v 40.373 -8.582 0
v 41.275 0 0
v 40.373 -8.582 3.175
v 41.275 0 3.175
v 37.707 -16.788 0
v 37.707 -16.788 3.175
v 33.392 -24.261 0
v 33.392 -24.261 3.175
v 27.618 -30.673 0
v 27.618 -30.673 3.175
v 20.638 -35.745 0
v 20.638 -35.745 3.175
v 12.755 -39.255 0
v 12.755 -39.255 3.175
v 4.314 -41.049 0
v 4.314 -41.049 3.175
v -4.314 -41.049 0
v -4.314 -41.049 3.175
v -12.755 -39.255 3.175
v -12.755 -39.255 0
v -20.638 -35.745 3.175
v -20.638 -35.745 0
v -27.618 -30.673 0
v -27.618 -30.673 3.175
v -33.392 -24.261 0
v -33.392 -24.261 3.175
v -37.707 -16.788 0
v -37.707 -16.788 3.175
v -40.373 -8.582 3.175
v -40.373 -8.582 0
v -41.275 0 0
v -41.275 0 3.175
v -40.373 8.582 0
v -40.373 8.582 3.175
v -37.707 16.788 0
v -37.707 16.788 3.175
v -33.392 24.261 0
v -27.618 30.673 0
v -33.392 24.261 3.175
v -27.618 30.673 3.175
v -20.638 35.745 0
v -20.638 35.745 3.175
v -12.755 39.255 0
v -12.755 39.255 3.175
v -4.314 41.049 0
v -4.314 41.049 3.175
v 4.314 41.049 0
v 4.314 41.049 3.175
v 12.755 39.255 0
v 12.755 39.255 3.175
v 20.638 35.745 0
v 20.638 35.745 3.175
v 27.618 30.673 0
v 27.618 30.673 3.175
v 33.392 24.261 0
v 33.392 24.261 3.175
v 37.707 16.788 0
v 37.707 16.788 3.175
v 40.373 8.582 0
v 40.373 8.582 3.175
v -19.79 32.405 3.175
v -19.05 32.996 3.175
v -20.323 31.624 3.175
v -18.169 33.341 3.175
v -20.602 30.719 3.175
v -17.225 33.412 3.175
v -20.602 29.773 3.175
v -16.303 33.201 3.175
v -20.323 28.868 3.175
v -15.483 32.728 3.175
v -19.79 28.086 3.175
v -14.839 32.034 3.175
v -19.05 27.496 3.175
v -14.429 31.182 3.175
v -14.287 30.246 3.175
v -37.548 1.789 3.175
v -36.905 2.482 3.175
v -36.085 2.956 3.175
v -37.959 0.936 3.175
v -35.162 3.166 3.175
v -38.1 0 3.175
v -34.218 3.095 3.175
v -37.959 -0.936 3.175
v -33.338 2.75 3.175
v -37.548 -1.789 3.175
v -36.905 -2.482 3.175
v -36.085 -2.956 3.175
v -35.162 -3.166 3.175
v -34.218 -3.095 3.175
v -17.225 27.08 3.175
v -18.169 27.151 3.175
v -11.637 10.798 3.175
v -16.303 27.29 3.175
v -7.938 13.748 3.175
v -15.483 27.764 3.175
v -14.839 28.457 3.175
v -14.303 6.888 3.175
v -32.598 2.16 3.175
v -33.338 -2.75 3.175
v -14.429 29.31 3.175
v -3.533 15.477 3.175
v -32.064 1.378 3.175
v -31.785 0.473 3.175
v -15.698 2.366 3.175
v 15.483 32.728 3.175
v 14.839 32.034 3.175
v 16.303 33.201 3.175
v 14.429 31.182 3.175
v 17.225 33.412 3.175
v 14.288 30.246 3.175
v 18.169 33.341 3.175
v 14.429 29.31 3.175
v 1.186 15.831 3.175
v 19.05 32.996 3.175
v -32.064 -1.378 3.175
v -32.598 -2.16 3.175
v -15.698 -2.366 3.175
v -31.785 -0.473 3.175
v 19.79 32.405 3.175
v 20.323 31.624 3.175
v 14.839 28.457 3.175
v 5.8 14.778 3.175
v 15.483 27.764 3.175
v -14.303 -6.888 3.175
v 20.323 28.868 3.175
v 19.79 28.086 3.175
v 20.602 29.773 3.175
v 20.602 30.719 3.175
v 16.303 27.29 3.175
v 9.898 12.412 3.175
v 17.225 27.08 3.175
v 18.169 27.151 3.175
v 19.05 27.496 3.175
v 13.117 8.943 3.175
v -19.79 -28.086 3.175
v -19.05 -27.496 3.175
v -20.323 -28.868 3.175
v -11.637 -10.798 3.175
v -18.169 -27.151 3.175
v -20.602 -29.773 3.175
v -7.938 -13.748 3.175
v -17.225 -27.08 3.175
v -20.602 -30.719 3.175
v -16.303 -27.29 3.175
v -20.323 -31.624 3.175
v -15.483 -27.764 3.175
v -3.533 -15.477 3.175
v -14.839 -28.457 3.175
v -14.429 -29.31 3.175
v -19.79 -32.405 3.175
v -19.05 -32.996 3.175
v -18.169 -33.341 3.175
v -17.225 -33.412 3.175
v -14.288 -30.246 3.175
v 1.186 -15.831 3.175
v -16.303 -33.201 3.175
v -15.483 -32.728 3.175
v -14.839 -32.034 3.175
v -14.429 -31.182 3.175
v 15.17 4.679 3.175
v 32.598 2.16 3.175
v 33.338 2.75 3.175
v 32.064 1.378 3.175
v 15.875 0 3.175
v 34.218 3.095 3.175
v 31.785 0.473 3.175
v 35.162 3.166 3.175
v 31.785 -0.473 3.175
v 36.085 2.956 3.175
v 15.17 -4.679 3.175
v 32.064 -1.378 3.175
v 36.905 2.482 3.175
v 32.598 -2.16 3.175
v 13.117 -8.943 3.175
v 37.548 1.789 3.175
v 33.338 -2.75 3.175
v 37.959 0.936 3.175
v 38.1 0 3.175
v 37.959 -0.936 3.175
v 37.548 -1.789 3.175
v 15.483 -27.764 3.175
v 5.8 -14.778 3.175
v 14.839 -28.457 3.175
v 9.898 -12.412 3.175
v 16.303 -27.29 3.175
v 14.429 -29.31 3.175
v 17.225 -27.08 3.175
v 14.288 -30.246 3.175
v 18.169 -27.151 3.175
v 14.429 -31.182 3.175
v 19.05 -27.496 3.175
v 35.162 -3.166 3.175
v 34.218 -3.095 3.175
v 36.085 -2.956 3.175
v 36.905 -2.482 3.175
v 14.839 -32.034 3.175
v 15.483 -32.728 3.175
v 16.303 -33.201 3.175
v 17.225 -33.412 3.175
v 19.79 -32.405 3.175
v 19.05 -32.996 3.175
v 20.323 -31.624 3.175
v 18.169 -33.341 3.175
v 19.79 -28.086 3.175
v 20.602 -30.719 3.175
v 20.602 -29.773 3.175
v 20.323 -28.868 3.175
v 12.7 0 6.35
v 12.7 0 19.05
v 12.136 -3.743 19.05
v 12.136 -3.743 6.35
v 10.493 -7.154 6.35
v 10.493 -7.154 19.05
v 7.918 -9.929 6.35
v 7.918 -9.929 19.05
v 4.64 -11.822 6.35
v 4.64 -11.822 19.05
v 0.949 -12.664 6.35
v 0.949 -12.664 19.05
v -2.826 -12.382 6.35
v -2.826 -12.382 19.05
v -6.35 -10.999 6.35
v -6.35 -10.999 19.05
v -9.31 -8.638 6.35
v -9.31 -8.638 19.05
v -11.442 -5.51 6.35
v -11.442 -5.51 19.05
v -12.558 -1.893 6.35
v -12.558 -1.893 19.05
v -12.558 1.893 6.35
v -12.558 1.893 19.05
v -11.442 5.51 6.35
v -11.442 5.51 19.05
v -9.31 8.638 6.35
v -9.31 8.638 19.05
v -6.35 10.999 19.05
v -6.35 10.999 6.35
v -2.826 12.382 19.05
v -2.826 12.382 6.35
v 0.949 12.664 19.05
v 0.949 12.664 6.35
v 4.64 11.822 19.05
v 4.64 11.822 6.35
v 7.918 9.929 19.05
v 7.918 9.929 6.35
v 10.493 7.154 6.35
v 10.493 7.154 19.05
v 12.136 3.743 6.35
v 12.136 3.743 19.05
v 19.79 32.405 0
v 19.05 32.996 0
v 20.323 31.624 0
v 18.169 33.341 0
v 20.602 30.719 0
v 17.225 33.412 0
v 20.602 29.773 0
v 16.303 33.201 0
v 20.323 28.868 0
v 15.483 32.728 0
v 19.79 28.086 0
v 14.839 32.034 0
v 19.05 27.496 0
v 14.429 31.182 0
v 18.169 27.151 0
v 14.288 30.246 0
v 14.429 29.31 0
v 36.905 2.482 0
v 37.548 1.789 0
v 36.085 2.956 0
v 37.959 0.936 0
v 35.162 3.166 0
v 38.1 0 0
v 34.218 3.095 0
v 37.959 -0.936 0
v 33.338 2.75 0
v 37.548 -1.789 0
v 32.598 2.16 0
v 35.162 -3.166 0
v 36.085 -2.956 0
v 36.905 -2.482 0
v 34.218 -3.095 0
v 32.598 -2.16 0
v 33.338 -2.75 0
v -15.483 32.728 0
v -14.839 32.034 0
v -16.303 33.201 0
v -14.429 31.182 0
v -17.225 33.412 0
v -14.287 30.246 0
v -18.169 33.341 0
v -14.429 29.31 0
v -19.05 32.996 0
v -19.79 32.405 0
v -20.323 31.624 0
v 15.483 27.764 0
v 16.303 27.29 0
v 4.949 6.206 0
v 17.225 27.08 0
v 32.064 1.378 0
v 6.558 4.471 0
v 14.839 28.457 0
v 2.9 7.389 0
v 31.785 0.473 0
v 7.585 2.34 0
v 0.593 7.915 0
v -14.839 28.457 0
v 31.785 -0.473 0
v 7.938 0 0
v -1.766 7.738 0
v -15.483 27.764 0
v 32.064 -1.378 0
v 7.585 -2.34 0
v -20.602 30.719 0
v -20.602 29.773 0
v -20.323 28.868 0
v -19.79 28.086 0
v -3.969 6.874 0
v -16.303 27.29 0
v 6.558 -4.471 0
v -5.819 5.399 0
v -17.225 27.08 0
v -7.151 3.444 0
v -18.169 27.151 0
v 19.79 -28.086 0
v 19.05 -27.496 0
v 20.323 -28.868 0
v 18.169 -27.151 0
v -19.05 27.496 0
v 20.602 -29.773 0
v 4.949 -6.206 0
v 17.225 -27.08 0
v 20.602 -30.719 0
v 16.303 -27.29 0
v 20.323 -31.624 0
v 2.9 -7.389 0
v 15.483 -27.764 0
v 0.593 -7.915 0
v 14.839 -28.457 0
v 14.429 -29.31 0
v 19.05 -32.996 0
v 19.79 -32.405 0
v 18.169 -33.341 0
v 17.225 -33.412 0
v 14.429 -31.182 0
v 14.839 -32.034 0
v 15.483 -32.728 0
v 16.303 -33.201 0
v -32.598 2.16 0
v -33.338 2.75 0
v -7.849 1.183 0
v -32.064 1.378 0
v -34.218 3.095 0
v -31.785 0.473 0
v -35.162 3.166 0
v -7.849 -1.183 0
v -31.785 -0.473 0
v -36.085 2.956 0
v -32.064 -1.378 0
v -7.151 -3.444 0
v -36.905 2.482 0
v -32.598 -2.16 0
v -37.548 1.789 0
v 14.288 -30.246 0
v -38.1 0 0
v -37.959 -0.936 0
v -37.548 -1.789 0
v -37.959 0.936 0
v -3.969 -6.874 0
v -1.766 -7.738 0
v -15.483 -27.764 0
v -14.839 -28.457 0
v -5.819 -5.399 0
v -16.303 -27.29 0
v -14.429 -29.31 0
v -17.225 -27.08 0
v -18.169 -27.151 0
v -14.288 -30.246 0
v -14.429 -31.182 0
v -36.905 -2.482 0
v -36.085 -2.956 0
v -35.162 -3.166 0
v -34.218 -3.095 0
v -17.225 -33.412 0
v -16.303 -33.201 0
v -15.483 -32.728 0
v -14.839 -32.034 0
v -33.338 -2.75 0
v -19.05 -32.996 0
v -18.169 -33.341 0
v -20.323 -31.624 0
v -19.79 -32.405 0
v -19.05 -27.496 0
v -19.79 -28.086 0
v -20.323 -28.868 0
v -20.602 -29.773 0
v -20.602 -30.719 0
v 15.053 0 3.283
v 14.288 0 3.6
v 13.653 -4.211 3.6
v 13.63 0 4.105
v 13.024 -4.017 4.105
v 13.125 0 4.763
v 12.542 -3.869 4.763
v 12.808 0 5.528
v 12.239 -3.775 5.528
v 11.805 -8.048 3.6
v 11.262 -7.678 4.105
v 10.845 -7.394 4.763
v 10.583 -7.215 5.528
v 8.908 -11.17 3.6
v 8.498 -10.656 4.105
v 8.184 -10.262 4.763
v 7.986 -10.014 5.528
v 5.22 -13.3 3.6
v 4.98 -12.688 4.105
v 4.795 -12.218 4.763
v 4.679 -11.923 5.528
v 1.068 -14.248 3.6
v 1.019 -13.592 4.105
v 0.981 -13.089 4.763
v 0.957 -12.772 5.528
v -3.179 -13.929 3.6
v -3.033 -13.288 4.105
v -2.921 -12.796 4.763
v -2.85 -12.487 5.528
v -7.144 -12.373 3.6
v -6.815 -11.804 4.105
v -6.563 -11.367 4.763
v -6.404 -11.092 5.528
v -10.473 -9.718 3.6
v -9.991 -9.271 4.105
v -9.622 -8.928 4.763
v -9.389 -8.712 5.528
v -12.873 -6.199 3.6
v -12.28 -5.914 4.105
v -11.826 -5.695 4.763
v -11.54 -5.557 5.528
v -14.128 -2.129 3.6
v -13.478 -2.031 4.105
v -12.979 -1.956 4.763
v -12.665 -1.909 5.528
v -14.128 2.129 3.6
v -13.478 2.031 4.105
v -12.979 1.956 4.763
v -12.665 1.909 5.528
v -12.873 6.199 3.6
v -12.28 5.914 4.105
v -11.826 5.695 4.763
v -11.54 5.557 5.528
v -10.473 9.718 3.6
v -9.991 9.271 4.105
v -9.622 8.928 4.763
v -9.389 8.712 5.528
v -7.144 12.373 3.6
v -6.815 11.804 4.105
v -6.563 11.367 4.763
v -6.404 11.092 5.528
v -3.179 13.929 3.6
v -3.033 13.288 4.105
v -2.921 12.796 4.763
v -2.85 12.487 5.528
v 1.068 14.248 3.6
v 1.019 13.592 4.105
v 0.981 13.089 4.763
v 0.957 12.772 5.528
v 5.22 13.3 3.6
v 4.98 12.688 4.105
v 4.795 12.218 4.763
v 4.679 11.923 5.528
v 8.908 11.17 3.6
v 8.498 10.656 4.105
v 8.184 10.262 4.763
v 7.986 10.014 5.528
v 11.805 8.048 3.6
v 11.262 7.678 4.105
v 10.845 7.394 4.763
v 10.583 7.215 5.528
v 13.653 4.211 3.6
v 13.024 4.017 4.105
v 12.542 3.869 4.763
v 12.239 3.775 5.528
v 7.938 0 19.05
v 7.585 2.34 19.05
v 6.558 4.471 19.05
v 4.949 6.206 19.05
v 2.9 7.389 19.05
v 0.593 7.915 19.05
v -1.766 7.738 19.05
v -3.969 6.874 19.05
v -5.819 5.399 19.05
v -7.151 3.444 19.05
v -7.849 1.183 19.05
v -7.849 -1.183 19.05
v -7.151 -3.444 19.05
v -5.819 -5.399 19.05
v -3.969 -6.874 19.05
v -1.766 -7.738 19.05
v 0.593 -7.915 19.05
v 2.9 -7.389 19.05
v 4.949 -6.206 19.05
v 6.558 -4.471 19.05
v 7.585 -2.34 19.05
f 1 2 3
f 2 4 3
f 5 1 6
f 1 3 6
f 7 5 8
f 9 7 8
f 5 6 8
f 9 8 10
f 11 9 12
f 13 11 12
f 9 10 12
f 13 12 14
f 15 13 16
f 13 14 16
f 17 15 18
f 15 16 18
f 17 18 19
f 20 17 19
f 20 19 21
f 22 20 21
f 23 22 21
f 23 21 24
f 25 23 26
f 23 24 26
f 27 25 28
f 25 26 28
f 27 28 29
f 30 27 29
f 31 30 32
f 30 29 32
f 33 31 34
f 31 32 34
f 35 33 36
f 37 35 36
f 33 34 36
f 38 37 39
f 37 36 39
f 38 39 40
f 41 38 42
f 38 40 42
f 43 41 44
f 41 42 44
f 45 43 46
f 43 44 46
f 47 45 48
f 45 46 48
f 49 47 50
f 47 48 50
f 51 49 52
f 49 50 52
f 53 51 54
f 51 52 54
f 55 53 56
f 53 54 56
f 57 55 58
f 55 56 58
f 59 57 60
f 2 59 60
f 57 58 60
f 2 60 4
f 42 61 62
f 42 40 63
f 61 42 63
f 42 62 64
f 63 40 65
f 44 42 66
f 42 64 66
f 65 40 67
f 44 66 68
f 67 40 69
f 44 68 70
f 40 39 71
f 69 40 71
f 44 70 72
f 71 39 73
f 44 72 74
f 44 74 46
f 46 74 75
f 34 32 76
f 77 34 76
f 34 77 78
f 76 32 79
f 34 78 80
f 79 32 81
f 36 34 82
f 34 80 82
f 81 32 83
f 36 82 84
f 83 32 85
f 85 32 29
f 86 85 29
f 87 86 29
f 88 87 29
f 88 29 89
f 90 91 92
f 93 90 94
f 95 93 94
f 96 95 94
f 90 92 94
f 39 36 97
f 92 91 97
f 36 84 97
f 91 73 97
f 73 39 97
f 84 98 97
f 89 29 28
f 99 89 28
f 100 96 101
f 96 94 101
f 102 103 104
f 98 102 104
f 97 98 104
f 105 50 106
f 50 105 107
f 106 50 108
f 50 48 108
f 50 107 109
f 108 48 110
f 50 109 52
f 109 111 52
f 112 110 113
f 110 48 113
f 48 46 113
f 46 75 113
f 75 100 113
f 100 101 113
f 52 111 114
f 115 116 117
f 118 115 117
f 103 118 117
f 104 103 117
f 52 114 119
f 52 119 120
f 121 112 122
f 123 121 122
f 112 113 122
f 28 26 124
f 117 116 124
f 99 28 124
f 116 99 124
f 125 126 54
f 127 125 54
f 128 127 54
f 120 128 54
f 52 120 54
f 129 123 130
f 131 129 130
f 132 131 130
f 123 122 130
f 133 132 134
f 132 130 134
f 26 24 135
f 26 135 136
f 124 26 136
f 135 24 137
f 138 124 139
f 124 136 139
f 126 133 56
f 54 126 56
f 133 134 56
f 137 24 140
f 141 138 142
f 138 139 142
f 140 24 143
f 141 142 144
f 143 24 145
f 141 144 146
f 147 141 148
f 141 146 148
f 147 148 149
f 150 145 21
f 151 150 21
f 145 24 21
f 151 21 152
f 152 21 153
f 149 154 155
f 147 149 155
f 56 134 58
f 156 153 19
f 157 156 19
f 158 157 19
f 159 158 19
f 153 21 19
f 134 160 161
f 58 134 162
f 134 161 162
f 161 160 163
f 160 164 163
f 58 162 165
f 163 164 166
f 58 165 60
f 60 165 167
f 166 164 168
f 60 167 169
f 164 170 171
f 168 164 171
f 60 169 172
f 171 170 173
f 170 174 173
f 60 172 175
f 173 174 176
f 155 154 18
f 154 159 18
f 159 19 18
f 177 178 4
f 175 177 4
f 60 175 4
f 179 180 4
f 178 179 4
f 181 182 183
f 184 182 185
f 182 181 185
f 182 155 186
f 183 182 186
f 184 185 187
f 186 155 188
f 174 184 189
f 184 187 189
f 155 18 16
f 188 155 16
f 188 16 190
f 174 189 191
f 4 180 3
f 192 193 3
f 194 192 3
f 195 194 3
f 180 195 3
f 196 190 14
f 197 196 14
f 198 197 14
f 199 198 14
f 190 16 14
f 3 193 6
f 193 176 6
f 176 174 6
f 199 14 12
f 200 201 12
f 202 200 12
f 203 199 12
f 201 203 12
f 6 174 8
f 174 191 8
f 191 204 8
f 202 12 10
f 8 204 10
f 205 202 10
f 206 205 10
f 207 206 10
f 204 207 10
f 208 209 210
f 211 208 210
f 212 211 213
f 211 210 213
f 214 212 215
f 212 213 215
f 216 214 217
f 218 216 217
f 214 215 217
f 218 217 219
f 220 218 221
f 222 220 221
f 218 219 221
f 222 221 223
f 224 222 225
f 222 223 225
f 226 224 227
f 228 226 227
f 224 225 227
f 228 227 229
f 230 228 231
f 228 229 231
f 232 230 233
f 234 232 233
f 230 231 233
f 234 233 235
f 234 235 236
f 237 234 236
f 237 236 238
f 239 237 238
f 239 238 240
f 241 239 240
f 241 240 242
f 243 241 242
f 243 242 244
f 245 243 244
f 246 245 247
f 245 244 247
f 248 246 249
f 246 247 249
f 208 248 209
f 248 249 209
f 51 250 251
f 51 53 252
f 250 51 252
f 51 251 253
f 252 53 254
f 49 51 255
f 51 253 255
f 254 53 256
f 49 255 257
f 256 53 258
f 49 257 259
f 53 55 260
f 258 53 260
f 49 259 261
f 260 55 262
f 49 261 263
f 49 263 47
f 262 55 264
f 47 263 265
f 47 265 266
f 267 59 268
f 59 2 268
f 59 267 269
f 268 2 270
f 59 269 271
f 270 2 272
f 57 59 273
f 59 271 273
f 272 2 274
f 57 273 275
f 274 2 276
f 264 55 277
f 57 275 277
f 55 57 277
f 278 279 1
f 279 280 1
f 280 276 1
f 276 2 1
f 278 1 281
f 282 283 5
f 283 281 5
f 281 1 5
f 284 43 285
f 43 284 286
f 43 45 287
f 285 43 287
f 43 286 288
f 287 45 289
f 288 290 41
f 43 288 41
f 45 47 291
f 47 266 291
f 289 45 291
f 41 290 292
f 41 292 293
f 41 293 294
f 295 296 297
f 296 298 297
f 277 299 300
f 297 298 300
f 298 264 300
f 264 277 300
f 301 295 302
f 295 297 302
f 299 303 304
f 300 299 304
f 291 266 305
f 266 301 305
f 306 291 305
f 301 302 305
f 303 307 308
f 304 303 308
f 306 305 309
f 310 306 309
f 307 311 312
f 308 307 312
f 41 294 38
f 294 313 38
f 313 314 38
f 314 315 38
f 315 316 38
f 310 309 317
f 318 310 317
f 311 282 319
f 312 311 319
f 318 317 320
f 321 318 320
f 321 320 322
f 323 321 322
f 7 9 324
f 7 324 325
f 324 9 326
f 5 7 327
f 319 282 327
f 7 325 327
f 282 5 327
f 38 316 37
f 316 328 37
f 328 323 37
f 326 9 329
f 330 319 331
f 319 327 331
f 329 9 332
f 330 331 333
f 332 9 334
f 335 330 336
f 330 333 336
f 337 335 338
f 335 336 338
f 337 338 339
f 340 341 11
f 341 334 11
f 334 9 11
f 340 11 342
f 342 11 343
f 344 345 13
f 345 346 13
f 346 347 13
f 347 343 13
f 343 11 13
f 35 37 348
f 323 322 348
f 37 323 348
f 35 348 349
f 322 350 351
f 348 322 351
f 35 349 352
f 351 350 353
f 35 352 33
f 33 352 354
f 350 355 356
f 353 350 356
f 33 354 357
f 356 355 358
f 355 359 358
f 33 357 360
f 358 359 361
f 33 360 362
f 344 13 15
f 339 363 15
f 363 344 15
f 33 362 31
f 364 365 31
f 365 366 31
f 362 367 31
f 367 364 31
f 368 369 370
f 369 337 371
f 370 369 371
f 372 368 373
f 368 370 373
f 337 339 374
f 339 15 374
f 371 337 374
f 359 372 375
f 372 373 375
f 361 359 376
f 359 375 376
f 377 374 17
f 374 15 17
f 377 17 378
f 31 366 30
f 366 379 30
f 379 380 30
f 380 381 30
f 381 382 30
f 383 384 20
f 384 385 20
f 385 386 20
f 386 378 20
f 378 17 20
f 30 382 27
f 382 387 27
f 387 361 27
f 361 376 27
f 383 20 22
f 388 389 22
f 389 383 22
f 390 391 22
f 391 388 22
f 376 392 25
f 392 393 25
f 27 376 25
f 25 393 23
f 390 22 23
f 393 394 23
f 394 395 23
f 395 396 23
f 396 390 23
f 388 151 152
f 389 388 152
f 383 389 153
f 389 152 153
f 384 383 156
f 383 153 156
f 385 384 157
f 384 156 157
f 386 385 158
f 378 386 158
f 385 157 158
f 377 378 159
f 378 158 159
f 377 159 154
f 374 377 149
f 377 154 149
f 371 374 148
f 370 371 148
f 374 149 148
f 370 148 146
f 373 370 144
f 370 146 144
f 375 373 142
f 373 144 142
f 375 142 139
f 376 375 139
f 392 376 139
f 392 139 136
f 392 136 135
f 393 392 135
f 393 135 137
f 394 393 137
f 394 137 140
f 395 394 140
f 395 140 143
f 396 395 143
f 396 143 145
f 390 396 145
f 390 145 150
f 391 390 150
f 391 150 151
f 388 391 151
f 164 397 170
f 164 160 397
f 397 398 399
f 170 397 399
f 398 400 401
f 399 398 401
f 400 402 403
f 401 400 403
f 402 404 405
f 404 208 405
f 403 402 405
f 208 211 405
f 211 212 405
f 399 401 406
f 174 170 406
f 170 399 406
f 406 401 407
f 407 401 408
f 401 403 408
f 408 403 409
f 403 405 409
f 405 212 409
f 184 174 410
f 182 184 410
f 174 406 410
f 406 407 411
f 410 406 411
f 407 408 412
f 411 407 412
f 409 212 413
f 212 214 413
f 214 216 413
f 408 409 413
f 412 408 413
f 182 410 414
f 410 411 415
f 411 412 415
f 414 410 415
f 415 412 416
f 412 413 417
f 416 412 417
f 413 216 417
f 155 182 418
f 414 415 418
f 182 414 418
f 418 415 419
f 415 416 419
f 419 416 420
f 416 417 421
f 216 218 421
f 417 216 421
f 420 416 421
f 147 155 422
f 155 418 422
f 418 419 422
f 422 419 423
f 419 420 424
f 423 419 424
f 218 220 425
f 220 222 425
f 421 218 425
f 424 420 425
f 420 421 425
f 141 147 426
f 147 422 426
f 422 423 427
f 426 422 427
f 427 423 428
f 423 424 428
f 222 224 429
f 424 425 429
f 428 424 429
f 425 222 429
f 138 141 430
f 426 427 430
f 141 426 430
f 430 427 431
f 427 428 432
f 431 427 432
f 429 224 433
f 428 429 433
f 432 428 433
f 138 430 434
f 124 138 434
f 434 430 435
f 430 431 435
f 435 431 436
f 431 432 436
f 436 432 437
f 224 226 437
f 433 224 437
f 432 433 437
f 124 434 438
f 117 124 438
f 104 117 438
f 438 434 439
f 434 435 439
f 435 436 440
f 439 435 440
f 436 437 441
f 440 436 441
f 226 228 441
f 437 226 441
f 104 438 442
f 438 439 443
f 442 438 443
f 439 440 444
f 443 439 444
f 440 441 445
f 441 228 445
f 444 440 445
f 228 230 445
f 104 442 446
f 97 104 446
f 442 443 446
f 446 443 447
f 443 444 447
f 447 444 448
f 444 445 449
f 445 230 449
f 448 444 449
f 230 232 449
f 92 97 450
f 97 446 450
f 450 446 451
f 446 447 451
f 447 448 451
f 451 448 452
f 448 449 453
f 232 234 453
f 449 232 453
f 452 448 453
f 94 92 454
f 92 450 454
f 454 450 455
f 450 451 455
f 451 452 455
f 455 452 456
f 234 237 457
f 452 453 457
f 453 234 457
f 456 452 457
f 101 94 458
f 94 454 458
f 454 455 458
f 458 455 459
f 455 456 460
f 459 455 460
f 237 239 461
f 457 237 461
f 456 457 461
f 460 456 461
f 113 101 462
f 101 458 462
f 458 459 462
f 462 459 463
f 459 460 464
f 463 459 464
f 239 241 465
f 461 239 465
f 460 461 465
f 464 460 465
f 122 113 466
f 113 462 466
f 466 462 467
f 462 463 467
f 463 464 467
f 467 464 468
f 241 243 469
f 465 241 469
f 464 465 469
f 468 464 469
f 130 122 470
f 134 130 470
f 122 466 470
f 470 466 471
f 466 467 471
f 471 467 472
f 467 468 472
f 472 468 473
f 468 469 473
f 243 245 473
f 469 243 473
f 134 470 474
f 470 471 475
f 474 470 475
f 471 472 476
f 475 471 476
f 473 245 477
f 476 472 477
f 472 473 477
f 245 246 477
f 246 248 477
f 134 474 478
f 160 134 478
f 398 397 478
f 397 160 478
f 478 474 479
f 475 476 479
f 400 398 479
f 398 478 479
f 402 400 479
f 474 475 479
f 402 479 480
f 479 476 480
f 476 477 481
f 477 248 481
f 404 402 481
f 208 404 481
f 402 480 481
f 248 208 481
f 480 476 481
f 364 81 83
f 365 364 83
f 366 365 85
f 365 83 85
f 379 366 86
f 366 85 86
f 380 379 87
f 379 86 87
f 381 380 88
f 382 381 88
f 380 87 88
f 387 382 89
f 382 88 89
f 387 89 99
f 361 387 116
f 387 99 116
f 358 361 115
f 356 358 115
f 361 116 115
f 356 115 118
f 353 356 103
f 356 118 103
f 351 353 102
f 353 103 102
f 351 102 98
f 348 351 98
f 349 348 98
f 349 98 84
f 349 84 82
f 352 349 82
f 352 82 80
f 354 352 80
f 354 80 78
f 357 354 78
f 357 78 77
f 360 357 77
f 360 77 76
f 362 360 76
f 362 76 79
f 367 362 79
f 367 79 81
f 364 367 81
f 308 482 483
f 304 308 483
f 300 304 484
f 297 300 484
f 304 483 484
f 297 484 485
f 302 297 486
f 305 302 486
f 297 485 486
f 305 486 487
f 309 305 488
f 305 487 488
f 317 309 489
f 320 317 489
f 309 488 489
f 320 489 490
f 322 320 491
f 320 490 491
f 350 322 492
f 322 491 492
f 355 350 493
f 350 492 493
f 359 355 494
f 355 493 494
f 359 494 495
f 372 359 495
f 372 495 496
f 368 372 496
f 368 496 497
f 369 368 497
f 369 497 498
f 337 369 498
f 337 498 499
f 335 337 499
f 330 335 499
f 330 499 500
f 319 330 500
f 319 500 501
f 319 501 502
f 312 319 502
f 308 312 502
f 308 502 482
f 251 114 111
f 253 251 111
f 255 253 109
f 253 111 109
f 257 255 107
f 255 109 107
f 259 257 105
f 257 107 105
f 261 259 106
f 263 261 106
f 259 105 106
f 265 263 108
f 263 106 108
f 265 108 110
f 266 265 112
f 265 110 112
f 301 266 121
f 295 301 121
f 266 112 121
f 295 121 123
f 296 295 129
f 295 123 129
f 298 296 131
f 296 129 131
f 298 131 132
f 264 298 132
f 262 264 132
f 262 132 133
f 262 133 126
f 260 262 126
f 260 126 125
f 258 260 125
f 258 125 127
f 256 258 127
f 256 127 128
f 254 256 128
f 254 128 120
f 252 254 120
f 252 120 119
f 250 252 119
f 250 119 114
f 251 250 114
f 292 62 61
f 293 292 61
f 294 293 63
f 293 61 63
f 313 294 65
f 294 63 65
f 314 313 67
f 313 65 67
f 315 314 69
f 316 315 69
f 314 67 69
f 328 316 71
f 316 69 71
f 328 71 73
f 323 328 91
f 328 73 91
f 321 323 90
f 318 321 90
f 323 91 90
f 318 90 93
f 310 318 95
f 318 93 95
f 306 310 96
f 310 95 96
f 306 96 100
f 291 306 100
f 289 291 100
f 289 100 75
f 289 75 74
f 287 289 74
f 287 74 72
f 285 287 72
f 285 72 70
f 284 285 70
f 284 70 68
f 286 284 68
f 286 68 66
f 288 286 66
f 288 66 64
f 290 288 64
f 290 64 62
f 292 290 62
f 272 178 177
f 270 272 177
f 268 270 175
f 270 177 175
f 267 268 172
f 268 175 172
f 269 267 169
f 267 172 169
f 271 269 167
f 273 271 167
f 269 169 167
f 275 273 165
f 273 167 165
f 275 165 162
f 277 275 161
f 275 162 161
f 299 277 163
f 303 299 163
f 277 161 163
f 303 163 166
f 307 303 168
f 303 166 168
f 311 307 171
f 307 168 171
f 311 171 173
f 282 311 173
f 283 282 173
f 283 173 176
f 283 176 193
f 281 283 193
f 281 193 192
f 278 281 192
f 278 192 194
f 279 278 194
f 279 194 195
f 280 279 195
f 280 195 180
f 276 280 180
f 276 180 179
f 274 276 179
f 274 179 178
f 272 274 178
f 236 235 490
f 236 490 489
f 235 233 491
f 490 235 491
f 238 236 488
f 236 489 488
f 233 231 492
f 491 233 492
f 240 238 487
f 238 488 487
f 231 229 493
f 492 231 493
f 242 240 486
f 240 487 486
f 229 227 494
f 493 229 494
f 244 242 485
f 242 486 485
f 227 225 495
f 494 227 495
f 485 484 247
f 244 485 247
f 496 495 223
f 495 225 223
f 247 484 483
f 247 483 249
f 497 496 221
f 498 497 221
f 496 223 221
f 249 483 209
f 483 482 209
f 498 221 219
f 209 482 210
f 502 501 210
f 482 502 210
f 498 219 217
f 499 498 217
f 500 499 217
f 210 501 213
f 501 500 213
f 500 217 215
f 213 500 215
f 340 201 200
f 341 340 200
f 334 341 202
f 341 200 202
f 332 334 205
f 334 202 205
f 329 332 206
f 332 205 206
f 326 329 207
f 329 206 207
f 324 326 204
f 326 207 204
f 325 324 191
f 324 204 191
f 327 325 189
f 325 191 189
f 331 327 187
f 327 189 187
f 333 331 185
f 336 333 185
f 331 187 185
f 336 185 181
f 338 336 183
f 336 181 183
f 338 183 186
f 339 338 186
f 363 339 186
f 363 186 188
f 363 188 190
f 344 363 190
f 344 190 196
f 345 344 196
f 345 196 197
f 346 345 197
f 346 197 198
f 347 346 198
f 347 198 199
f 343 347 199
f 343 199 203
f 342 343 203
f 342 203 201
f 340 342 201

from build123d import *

# Parameters (mm, degrees)
SKETCH2_R          = 7.9375
CUT_EXTRUDE1_DEPTH = 62.401577748
SKETCH3_R          = 3.175
CUT_EXTRUDE2_DEPTH = 61.491874454
CIRPATTERN1_COUNT  = 6
FILLET1_R          = 3.175


with BuildPart() as part:
    # Sketch1 → Flange Base (revolve)
    with BuildSketch(Plane(origin=(0, 0, 0), x_dir=(0, 0, -1), z_dir=(1, 0, 0)), mode=Mode.PRIVATE) as flange_base_sk:
        Polygon((-19.05, 0), (0, 0), (0, 41.275), (-3.175, 41.275), (-3.175, 12.7), (-19.05, 12.7), align=None)
    revolve(flange_base_sk.sketch.rotate(Axis((0, 0, 19.05), (0, 0, -1)), 90), axis=Axis((0, 0, 19.05), (0, 0, -1)))

    # Sketch2 → Cut-Extrude1 (cut, through all)
    with BuildSketch(Plane.XY.offset(19.05)):
        Circle(SKETCH2_R)
    extrude(amount=-CUT_EXTRUDE1_DEPTH, mode=Mode.SUBTRACT)

    # Sketch3 → Cut-Extrude2 (cut, through all)
    with BuildSketch(Plane.XY.offset(3.175)):
        with Locations((34.925, 0)):
            Circle(SKETCH3_R)
    cut_extrude2 = extrude(amount=-CUT_EXTRUDE2_DEPTH, mode=Mode.SUBTRACT)

    # CirPattern1: Cut-Extrude2 ×6 about axis
    cirpattern1_axis = Axis((0, 0, 0), (0, 0, 1))
    for i in range(1, CIRPATTERN1_COUNT):
        add(cut_extrude2.rotate(cirpattern1_axis, i * 360 / CIRPATTERN1_COUNT), mode=Mode.SUBTRACT)

    # Fillet1
    fillet1_edges = [part.edges().sort_by_distance(p)[0] for p in [
        (-12.7, 0, 3.175),
    ]]
    fillet(fillet1_edges, radius=FILLET1_R)


solid = part.part
